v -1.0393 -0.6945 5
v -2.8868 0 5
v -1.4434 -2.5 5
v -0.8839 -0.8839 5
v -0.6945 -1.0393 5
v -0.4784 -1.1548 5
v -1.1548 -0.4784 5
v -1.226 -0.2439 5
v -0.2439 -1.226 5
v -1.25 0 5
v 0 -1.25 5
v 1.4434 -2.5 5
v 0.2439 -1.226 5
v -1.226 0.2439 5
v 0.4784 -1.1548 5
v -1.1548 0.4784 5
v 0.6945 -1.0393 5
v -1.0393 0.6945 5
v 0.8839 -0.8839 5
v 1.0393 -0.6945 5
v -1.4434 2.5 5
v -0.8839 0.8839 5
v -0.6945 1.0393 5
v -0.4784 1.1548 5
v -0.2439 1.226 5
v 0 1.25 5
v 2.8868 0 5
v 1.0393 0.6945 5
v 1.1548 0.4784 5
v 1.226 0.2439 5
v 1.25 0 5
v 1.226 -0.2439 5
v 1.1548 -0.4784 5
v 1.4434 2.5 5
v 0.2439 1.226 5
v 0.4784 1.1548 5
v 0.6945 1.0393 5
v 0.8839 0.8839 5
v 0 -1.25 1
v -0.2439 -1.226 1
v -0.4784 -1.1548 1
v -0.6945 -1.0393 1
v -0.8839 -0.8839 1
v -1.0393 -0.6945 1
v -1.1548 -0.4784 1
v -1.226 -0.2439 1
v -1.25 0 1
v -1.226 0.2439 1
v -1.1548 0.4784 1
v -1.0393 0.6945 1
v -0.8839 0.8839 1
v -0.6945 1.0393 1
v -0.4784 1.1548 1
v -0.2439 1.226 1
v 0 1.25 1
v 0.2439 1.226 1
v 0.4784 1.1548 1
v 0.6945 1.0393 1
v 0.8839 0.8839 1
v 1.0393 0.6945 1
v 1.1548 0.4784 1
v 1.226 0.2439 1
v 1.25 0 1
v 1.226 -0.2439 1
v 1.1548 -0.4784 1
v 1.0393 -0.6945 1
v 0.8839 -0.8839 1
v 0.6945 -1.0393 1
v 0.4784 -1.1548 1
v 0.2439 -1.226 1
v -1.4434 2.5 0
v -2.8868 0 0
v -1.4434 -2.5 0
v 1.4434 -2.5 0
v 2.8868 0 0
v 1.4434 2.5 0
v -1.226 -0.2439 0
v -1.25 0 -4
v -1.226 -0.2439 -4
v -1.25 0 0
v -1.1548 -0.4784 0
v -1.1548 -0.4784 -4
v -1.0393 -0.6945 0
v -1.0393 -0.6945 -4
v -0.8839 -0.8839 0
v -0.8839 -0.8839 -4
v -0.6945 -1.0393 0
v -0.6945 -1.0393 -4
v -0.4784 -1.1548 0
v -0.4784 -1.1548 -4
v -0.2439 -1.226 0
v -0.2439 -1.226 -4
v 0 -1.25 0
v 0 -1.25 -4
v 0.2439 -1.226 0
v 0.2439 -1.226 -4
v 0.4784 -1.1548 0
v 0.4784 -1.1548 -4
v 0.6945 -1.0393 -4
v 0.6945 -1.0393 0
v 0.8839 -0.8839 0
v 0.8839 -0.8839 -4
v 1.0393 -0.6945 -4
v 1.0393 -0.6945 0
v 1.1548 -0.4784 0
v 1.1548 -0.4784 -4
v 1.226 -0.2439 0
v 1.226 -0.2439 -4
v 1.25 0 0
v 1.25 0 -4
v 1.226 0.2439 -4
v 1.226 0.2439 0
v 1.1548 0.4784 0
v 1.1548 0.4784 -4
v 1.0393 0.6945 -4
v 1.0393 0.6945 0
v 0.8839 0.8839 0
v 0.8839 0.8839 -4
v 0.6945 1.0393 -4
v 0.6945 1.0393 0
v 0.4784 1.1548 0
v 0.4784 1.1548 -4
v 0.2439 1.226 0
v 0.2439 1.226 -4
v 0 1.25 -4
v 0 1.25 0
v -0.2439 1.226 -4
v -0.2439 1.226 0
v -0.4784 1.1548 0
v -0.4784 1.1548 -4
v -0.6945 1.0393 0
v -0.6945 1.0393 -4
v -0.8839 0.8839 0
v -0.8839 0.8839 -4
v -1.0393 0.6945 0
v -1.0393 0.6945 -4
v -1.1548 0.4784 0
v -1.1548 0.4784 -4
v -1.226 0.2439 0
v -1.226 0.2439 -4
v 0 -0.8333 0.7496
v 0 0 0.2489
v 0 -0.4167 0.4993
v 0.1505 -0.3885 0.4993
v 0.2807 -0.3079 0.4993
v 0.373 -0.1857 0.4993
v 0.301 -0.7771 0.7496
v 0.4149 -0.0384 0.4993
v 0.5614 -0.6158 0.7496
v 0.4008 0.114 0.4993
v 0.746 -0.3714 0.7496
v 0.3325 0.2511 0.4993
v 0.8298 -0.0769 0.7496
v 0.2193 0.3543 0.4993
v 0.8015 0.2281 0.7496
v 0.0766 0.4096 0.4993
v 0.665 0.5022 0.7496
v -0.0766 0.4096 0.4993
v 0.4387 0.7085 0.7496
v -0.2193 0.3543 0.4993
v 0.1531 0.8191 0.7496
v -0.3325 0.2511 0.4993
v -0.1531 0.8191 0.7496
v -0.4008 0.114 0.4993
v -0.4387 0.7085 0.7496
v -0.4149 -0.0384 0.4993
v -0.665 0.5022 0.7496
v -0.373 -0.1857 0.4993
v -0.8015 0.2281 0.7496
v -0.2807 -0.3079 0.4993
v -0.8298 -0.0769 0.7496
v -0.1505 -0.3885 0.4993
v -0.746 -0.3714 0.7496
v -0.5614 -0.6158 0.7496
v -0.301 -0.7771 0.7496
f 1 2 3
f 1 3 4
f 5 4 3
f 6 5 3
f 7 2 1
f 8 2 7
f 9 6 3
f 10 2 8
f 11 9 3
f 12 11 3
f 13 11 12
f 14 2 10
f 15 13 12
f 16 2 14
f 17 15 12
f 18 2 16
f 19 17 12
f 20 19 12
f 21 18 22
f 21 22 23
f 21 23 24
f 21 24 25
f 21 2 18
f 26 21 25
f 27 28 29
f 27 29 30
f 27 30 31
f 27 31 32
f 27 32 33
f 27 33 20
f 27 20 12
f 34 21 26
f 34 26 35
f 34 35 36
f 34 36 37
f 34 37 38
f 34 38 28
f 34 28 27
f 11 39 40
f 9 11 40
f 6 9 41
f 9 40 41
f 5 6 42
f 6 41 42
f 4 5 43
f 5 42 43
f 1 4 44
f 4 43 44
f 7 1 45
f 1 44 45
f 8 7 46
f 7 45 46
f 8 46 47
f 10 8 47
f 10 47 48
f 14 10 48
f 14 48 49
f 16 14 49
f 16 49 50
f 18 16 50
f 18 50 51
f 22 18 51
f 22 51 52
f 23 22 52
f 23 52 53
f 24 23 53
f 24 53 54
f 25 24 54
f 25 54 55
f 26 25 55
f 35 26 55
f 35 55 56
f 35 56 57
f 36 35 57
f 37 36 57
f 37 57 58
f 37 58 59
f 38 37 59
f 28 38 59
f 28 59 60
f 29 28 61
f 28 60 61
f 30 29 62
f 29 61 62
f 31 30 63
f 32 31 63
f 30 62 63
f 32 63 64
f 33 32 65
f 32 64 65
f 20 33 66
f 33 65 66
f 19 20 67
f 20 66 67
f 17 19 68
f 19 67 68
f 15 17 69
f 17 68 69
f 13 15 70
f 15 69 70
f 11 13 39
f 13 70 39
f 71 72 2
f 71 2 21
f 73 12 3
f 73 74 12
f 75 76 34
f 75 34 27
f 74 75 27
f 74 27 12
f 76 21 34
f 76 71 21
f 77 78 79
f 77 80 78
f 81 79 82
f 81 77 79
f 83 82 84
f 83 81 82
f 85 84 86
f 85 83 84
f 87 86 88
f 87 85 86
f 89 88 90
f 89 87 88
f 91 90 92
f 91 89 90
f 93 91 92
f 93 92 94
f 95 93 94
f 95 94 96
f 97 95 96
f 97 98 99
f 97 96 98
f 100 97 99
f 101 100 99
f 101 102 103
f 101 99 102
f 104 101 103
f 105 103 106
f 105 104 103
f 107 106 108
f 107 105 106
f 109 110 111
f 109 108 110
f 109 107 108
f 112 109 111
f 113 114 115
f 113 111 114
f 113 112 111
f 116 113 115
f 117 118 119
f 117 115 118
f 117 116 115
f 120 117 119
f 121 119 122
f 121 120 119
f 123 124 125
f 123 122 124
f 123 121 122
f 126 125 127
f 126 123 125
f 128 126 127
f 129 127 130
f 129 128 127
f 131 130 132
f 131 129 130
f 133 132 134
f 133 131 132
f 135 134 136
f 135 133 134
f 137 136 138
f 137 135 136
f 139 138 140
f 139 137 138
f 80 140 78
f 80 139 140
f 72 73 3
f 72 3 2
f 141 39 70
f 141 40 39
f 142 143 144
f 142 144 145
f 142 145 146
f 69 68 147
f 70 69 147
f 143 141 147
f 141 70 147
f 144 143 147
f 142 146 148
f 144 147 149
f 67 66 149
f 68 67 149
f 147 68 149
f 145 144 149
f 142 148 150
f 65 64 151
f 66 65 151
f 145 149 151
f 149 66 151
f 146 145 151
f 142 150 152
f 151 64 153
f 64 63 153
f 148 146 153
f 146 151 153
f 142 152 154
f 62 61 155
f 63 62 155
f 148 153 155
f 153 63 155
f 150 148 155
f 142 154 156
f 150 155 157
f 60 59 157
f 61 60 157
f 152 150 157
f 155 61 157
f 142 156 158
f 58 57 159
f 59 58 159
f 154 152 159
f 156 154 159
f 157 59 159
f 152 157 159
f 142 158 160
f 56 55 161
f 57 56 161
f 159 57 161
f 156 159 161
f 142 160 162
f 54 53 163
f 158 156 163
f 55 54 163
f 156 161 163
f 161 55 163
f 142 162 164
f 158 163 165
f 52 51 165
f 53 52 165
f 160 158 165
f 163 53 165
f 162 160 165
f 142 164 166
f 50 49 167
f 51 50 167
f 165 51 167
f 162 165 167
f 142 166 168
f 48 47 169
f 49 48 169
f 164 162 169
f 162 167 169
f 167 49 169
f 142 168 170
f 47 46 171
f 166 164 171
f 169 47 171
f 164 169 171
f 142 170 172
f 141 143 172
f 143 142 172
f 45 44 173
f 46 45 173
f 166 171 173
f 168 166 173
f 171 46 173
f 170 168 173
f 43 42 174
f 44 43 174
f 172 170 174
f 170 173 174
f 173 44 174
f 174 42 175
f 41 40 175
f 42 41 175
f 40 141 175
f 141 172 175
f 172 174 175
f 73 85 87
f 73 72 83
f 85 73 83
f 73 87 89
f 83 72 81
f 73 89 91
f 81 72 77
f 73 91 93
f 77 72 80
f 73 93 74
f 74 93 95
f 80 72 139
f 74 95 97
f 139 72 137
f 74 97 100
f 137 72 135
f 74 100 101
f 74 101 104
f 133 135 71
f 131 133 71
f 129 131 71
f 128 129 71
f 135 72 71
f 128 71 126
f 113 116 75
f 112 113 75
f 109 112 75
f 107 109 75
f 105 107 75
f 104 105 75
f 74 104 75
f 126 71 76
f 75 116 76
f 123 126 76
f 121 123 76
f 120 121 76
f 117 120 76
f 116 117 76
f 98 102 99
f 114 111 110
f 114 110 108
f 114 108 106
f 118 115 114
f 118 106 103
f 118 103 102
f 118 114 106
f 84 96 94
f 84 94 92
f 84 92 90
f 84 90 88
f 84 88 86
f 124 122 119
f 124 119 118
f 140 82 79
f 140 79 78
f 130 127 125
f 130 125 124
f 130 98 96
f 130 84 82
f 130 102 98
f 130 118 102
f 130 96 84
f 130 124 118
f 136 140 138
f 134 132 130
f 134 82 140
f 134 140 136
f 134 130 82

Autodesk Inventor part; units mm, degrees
ref_plane "YZ Plane" through (0, 0, 0) normal (1, 0, 0) x (0, 1, 0)
ref_plane "XZ Plane" through (0, 0, 0) normal (0, 1, 0) x (-1, 0, 0)
ref_plane "XY Plane" through (0, 0, 0) normal (0, 0, 1) x (1, 0, 0)
sketch "Skizze1" plane through (0, 0, 0) normal (0, 0, 1) x (1, 0, 0)
  line L0 (-1.4434, 2.5) -> (1.4434, 2.5)
  line L1 (1.4434, 2.5) -> (2.8868, 0)
  line L2 (2.8868, 0) -> (1.4434, -2.5)
  line L3 (1.4434, -2.5) -> (-1.4434, -2.5)
  line L4 (-1.4434, -2.5) -> (-2.8868, 0)
  line L5 (-2.8868, 0) -> (-1.4434, 2.5)
  point P0 (0, 0)
  point P1 (0, 0)
  point P2 (0, 2.5)
  point P3 (0, -2.5)
  dimension "d3" = 120
  dimension "d4" = 120
  dimension "d5" = 120
  dimension "d6" = 5
extrude "Extrusion1" add sketch "Skizze1" along normal blind 5
sketch "Skizze2" plane through (0, 0, 5) normal (0, 0, 1) x (1, 0, 0)
  point P0 (0, 0)
  point P1 (0, 0)
hole "Bohrung1" at (0, 0, 5) direction (0, 0, -1) diameter 2.5 depth 4 tip angle 118
thread "Gewinde1" size "M2.5x0.45" class "6H" standard "ANSI Metric M Profile" full length
sketch "Skizze3" plane through (0, 0, 0) normal (0, 0, -1) x (-1, 0, 0)
  circle A0 centre (0, 0) radius 1.25
  dimension "d18" = 2.5
extrude "Extrusion2" add sketch "Skizze3" along normal blind 4
thread "Gewinde2" size "M2.5x0.45" class "6g" standard "ANSI Metric M Profile" full length
properties part number "5mm_Außengewinde"
